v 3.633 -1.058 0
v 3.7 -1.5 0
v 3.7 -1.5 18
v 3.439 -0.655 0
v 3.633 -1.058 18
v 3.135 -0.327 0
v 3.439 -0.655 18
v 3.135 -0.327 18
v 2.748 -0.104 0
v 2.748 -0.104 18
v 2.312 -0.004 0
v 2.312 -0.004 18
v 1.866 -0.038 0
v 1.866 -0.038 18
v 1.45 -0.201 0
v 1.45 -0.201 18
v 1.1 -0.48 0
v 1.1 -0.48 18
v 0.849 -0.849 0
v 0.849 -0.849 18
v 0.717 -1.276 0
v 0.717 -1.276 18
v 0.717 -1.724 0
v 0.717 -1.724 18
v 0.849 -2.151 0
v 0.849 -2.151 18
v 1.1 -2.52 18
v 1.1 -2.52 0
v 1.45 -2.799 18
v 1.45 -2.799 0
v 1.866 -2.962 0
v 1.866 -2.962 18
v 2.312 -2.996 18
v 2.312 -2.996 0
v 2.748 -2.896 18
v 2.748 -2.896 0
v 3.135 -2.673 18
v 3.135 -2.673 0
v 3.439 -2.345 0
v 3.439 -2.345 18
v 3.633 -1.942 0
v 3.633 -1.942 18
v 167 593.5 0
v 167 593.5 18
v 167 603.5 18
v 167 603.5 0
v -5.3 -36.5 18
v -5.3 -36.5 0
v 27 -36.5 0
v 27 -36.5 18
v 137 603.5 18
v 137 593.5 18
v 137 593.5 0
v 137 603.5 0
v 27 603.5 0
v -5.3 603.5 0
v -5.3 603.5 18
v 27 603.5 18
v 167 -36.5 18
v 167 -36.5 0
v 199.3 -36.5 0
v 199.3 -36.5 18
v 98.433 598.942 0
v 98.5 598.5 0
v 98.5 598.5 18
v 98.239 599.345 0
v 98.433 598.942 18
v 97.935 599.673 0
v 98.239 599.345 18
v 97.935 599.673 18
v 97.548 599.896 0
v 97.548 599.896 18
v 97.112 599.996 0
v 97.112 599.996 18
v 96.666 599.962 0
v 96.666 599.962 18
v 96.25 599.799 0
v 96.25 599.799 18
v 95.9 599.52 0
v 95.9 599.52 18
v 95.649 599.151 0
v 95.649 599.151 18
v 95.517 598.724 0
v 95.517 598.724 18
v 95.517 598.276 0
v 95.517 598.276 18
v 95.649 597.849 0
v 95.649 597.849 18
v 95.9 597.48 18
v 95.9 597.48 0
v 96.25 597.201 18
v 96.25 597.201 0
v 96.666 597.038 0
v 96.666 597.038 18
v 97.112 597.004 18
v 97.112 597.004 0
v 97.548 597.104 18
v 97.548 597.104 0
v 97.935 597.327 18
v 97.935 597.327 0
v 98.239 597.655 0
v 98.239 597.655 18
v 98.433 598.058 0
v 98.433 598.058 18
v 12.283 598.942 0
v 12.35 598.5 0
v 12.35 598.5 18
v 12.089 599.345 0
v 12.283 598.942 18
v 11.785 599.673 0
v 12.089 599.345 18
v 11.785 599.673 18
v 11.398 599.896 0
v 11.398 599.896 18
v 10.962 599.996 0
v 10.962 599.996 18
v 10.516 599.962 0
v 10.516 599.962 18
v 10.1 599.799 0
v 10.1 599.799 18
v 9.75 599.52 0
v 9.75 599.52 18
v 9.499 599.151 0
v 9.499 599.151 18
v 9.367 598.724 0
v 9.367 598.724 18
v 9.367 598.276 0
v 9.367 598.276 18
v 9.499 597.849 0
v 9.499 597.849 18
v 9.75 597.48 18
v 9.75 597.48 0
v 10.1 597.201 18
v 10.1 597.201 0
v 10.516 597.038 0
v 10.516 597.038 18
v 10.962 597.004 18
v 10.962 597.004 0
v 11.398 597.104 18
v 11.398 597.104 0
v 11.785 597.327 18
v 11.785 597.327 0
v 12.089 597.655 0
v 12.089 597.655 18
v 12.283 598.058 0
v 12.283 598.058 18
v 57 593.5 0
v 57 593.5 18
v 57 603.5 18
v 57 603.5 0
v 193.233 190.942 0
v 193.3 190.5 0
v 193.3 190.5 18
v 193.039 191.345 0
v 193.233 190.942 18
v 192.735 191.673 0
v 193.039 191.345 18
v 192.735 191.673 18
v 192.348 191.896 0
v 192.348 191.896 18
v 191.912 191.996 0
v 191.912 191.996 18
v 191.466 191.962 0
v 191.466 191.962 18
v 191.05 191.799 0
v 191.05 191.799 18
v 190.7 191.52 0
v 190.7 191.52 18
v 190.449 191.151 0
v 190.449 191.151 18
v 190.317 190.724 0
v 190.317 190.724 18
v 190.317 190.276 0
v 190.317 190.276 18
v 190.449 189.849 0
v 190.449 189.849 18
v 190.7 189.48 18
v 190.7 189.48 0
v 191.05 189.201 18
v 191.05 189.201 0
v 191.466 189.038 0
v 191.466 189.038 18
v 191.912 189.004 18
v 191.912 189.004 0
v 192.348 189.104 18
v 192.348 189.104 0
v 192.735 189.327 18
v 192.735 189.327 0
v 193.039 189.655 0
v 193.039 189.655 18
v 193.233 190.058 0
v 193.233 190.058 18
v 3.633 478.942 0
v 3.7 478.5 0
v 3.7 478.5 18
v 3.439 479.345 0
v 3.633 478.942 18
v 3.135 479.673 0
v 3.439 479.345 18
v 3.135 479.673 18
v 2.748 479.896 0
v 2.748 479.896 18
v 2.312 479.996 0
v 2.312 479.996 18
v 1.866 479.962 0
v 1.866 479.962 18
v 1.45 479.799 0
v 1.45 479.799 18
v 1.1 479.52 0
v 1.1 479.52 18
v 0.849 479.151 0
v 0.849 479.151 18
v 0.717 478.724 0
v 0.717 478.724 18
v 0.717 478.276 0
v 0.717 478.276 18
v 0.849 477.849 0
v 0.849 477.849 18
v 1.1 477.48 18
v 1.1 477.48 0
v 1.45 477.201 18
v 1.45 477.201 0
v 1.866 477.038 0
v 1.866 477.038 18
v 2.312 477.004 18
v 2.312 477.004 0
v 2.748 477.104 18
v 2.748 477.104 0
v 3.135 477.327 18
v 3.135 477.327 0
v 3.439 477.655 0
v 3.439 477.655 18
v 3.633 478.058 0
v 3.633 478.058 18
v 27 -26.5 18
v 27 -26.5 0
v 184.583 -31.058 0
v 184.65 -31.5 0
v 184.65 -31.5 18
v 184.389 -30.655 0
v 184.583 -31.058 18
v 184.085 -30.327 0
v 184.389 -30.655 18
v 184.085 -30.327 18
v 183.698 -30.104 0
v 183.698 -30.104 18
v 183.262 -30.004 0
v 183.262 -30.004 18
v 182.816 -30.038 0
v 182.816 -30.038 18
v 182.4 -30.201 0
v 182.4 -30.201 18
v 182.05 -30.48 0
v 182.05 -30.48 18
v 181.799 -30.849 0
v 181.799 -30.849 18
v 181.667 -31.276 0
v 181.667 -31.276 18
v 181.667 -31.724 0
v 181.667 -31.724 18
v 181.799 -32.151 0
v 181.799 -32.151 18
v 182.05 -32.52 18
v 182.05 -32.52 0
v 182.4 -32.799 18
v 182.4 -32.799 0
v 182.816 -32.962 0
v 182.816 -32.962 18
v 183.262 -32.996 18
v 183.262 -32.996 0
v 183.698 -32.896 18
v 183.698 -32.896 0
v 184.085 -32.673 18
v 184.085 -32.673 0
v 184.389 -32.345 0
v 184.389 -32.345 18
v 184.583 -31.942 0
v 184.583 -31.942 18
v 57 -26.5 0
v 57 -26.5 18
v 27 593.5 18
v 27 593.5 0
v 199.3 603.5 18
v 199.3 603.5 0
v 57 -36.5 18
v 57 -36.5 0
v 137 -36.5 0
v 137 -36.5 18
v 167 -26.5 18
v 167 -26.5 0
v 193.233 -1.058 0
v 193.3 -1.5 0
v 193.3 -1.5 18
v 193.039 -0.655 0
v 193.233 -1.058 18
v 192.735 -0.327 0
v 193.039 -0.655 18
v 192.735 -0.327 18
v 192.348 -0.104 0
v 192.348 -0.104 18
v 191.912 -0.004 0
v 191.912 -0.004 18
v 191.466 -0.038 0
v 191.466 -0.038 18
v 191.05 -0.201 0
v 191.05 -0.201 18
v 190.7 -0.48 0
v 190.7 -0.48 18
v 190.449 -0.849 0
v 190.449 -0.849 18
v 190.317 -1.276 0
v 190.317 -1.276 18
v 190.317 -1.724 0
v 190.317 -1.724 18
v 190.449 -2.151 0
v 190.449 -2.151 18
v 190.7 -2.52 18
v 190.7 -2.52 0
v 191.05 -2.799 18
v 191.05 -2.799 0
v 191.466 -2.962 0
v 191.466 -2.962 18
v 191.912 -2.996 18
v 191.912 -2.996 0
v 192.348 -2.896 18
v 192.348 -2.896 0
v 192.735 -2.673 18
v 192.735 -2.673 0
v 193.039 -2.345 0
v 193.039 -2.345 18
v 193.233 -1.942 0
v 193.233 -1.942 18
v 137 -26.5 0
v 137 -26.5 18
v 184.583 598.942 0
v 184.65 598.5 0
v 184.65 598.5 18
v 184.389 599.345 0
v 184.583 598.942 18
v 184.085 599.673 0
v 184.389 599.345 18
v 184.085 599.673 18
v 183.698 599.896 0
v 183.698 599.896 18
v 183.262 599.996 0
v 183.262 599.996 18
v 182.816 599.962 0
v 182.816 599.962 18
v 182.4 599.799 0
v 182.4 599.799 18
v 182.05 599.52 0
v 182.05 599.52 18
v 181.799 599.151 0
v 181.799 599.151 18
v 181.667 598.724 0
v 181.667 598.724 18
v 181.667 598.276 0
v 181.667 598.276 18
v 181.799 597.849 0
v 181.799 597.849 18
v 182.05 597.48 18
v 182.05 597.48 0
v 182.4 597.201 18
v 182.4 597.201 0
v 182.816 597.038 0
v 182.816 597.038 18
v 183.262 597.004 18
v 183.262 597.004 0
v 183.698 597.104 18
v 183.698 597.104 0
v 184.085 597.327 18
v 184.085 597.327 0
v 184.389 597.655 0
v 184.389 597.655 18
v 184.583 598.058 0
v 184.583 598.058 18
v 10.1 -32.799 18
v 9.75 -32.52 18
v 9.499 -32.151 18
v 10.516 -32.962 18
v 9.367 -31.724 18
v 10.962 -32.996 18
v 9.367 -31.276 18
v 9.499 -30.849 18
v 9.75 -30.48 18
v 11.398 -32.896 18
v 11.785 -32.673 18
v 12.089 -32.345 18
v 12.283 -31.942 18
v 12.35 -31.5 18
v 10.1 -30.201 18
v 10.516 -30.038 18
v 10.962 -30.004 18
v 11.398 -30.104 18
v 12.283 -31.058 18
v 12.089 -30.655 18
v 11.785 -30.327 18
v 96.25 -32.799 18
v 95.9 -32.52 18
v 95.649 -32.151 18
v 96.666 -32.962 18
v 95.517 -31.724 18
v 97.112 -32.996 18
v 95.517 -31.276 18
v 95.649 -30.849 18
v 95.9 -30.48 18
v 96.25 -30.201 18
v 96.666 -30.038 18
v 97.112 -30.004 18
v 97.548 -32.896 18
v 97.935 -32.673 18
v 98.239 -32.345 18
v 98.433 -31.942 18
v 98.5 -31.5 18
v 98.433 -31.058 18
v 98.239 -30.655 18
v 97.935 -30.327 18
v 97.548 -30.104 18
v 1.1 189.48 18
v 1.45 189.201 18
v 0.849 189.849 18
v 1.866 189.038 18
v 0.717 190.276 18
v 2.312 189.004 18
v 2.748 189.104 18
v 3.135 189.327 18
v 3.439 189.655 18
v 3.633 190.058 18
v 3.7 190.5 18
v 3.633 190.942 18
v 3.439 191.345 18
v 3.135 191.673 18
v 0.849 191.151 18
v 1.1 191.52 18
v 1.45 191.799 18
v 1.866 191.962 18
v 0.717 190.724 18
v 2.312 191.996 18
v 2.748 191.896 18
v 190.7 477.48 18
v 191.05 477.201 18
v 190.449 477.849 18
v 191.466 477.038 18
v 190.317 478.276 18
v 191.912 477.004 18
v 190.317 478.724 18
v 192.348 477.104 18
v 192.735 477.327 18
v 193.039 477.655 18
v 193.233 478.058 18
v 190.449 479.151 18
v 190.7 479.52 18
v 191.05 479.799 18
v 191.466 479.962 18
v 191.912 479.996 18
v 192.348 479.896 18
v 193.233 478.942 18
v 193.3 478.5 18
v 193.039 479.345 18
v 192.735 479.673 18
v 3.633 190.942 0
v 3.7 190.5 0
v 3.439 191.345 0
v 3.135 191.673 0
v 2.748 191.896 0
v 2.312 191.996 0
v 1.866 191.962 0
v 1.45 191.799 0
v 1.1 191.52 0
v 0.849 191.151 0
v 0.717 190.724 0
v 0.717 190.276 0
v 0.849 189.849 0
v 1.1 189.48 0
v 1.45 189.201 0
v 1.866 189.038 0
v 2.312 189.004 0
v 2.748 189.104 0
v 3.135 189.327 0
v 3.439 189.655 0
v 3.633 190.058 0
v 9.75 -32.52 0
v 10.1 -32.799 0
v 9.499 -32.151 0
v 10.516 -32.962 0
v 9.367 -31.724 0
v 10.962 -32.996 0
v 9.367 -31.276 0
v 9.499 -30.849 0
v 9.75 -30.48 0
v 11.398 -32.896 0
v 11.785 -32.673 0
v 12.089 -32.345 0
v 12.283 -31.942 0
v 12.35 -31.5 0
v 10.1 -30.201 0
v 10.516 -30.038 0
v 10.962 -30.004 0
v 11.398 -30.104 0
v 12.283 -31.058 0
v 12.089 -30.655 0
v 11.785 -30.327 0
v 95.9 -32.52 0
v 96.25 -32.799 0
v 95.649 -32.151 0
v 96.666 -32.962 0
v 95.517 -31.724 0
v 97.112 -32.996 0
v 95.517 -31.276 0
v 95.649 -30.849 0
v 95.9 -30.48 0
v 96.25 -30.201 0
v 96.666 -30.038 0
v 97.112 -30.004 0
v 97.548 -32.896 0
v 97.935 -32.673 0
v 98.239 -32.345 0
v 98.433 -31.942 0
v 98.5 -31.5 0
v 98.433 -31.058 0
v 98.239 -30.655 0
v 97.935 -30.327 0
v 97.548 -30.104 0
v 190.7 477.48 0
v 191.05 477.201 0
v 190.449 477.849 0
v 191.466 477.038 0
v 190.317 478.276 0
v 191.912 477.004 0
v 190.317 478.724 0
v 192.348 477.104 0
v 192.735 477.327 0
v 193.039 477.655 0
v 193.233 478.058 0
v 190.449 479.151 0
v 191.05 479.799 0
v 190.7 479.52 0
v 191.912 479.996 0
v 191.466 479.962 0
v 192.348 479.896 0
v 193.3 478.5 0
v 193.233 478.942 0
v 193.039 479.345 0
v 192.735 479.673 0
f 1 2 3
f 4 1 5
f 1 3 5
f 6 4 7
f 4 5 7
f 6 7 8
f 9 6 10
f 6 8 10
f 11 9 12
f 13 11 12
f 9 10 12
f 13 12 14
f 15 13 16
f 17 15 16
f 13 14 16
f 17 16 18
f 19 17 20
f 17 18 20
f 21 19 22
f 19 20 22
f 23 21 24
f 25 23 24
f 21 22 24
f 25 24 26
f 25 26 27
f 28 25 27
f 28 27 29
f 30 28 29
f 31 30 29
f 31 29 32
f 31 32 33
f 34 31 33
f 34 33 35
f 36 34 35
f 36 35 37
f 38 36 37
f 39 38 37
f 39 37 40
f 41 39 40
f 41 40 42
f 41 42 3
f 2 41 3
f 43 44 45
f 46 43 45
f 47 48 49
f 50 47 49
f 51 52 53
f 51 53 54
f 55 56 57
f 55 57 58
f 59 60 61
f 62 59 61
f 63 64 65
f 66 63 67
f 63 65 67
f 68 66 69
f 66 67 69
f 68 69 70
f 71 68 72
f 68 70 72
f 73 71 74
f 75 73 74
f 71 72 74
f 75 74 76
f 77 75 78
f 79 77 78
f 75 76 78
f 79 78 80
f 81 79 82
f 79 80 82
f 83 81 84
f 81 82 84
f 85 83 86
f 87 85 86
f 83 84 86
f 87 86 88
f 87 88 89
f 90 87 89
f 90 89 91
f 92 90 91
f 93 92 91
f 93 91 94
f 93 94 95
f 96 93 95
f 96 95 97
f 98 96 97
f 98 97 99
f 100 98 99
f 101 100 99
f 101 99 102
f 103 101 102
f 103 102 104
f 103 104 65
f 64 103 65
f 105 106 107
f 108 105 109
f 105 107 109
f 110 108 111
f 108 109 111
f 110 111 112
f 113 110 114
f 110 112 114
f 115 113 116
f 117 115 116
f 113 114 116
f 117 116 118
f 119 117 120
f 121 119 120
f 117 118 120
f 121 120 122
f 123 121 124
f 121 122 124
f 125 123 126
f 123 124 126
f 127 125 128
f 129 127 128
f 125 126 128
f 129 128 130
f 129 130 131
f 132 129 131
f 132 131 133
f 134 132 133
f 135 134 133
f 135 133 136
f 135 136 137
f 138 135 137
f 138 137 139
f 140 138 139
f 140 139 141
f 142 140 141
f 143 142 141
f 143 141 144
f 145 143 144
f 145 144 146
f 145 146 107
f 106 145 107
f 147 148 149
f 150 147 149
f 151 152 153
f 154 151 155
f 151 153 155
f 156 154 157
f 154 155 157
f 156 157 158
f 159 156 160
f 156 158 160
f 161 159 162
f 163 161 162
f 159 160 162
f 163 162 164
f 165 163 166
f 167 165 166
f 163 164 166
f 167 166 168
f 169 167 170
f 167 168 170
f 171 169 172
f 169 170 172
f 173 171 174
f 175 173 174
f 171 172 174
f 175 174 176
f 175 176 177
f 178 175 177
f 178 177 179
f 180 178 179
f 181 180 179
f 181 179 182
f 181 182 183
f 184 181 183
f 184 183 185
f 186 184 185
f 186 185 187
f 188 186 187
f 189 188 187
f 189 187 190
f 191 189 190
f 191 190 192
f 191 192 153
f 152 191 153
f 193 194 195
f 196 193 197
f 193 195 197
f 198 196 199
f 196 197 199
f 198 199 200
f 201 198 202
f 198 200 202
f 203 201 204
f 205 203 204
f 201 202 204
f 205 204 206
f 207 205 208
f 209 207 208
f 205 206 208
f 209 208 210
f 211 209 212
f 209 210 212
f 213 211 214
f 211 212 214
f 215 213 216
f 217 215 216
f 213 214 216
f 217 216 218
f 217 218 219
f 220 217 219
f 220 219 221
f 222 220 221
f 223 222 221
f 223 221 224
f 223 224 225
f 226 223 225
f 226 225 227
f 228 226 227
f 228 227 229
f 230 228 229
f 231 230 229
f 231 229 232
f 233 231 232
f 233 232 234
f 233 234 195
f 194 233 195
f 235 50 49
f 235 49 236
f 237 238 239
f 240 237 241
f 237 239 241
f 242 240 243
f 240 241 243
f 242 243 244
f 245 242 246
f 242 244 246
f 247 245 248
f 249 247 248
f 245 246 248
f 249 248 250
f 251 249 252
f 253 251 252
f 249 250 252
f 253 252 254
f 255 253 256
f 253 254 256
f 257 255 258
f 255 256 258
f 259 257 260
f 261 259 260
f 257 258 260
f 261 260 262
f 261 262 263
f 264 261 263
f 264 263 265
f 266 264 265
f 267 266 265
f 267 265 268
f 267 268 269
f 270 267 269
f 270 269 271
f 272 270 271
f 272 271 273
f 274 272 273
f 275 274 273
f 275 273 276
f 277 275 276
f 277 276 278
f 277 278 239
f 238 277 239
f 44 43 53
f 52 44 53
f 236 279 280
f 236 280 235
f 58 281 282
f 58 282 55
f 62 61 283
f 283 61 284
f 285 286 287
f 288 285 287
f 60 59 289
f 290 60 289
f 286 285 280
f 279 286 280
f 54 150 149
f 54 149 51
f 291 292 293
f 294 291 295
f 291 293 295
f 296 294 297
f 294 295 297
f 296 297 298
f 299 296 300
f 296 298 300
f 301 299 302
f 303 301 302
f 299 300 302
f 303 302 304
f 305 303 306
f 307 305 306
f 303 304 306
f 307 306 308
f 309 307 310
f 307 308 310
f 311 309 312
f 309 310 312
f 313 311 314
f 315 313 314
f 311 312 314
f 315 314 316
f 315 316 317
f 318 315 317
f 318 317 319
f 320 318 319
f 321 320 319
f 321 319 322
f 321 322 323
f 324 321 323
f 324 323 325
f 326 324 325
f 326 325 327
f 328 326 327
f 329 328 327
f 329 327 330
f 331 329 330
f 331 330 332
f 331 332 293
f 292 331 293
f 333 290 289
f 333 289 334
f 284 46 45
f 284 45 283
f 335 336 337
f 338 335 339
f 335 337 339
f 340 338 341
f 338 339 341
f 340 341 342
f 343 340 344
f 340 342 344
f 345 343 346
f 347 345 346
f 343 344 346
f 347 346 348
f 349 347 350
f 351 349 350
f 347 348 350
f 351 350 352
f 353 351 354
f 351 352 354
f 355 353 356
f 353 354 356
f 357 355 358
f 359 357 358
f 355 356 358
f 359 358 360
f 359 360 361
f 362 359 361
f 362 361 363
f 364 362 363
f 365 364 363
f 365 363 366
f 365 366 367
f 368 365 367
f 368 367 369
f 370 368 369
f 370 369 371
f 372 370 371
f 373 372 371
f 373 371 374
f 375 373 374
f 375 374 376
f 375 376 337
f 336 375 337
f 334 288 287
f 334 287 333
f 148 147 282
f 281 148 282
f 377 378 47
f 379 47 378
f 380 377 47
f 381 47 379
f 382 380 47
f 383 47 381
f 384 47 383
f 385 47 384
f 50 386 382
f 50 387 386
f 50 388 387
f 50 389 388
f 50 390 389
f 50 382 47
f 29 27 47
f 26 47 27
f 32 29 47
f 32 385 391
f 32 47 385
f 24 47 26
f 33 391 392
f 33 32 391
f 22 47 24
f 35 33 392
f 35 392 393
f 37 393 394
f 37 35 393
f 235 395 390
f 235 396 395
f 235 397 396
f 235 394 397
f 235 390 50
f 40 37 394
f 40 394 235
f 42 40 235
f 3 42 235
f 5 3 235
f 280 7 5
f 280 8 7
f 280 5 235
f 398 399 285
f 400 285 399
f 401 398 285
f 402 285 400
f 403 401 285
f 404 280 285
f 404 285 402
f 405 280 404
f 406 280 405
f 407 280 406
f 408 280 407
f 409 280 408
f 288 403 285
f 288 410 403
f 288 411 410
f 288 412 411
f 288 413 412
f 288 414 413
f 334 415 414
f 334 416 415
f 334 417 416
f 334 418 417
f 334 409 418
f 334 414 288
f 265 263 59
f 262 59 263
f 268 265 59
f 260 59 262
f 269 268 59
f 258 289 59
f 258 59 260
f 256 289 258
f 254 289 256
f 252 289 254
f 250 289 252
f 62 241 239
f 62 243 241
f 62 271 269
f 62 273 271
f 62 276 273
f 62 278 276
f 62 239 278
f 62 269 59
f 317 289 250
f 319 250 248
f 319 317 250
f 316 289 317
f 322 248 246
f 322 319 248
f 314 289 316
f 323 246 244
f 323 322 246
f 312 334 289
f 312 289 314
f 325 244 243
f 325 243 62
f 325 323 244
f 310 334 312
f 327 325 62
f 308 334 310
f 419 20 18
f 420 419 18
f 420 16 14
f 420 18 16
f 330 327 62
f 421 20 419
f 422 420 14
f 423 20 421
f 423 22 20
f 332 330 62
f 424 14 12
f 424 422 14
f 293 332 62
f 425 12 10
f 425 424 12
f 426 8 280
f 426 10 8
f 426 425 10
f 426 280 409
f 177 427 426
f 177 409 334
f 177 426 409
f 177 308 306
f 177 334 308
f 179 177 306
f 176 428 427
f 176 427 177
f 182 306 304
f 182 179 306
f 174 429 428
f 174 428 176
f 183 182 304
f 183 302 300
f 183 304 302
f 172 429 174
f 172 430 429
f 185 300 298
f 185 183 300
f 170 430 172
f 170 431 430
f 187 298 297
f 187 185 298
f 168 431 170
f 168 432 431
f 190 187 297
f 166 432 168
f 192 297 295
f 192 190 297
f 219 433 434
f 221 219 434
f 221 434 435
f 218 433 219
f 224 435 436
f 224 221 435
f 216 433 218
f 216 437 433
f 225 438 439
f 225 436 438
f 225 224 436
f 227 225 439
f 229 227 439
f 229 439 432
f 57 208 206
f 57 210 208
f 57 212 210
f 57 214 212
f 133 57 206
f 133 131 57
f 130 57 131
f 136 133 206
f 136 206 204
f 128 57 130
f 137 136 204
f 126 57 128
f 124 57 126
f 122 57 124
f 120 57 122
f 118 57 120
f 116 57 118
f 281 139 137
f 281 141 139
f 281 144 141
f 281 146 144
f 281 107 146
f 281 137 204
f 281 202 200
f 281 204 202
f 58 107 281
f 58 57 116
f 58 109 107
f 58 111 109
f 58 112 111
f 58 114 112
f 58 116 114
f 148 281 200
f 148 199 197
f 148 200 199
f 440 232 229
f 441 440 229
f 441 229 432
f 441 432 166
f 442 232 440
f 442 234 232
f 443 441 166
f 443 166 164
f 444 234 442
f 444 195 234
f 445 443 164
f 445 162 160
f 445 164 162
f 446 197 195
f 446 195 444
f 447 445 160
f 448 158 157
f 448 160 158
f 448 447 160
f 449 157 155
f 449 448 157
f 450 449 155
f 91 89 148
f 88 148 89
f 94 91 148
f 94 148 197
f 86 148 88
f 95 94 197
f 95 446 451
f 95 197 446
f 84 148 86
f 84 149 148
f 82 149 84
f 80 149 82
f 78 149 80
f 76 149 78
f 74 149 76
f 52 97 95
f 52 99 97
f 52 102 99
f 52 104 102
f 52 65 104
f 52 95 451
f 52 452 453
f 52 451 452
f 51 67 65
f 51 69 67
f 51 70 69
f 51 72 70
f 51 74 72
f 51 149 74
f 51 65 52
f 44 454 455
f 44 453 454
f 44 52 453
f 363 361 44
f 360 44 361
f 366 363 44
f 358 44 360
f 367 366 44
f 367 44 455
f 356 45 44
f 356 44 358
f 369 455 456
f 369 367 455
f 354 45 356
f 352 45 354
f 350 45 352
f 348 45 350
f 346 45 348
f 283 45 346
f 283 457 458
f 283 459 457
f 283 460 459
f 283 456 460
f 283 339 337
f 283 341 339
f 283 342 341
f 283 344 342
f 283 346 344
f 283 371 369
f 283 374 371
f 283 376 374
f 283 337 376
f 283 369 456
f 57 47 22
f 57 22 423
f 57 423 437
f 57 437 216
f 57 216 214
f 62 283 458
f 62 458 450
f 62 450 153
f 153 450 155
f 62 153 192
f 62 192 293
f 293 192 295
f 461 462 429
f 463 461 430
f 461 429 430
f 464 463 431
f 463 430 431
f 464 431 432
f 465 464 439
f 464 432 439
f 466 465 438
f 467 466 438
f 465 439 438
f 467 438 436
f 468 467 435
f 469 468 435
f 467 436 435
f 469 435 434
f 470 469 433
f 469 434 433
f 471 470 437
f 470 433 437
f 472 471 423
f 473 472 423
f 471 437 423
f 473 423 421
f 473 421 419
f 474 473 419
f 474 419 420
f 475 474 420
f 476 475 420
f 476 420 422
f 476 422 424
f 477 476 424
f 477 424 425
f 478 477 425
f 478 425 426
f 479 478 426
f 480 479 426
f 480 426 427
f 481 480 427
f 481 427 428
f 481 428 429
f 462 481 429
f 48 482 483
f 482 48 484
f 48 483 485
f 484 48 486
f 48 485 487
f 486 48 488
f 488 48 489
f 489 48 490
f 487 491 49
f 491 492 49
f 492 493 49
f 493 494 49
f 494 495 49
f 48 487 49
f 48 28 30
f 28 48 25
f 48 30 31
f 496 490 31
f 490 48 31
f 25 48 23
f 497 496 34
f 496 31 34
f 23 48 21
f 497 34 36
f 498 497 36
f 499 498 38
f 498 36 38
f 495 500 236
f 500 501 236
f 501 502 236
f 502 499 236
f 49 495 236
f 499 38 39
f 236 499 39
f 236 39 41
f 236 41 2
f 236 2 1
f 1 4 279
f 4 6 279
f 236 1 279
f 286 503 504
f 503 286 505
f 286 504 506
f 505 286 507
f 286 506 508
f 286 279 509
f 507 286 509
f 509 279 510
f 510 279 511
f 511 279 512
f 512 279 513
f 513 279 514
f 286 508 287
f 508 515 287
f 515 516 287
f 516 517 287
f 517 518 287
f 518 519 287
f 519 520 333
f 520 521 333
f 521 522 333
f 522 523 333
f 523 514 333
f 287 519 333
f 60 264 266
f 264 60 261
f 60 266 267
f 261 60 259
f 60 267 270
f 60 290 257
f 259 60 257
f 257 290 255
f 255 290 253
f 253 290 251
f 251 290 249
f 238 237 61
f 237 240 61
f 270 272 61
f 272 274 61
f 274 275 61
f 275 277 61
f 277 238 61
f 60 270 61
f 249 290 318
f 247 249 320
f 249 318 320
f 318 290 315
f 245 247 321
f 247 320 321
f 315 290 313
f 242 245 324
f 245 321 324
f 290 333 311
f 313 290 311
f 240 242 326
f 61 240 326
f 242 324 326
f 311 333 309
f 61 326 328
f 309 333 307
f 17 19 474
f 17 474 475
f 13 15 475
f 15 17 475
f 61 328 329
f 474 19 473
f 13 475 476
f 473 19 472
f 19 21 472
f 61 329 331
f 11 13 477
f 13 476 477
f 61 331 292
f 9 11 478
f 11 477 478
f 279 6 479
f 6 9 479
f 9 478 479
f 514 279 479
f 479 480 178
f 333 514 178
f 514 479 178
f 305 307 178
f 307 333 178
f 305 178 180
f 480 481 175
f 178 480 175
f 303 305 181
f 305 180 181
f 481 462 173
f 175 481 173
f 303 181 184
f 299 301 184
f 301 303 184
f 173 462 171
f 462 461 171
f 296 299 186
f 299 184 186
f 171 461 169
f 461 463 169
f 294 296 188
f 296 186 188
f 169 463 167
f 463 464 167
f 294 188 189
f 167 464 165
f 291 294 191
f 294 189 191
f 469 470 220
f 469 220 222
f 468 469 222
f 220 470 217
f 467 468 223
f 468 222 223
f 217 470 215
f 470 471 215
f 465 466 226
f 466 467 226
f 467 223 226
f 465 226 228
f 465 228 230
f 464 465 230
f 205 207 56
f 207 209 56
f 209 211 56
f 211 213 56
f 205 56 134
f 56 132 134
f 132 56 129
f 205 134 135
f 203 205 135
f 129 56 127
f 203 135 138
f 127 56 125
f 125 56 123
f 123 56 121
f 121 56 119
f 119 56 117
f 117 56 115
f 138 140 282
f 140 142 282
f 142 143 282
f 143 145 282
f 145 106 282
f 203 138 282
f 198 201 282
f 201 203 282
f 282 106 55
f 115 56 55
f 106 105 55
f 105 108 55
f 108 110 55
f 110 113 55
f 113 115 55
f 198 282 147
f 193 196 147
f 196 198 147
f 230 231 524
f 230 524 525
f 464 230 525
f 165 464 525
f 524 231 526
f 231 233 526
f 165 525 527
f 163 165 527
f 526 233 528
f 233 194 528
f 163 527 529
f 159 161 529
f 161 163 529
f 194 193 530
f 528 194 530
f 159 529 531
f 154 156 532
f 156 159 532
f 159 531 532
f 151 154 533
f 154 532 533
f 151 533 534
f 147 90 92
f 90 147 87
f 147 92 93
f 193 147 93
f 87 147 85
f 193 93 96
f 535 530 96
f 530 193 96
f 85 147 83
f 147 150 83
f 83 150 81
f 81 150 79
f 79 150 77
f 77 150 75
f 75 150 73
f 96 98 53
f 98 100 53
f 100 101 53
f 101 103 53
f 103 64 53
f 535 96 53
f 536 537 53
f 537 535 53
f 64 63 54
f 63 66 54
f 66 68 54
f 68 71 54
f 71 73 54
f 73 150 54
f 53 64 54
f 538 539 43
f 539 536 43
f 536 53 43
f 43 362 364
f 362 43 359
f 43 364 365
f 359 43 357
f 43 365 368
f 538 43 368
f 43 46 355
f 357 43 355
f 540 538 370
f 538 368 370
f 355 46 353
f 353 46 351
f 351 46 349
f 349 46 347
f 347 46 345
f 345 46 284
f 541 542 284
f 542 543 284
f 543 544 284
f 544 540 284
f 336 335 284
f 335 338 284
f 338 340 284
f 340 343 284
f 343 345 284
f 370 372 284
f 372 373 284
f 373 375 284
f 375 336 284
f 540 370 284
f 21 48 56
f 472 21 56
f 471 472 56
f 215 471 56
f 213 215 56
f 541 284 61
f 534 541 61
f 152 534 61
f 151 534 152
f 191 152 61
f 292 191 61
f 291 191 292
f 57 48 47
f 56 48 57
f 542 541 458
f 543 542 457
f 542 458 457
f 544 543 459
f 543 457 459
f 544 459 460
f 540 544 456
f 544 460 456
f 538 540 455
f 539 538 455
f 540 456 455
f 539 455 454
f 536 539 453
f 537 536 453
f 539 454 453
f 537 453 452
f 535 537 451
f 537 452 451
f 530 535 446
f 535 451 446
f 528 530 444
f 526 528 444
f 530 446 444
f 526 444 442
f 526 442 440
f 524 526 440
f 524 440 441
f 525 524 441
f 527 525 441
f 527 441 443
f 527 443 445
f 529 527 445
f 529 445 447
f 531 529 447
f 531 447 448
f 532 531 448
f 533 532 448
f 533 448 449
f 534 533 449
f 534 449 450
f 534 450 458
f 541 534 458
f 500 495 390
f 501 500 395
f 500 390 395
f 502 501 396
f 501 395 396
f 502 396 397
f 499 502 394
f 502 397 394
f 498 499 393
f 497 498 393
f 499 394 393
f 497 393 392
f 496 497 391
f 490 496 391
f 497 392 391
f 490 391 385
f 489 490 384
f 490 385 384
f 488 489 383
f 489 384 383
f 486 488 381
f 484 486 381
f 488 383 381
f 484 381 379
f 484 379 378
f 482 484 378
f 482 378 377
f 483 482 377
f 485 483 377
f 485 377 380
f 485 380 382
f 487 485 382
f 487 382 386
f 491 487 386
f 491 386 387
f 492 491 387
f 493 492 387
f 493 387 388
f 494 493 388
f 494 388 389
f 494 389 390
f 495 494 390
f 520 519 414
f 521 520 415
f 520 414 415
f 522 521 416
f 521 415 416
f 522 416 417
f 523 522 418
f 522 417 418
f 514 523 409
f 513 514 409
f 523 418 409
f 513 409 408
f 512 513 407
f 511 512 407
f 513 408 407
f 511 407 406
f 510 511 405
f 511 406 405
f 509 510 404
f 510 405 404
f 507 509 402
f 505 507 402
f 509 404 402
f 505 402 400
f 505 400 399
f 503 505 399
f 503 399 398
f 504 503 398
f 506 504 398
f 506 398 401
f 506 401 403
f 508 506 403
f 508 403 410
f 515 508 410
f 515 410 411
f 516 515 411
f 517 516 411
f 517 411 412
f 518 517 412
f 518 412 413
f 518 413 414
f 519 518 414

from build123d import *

# Parameters (mm, degrees)
SKETCH1_W                = 204.6
SKETCH1_H                = 640
BOSS_EXTRUDE1_DEPTH      = 18
SKETCH4_W                = 30
SKETCH4_H                = 10
CUT_EXTRUDE1_DEPTH       = 18
F_3_0_3_DIAMETER_HOLE3_D = 3
F_3_0_3_DIAMETER_HOLE5_D = 3


with BuildPart() as part:
    # Sketch1 → Boss-Extrude1 (new body)
    with BuildSketch(Plane.XY):
        with Locations((97, 283.5)):
            Rectangle(SKETCH1_W, SKETCH1_H)
    extrude(amount=BOSS_EXTRUDE1_DEPTH)

    # Sketch4 → Cut-Extrude1 (cut)
    with BuildSketch(Plane(origin=(0, 0, 0), x_dir=(-1, 0, 0), z_dir=(0, 0, -1))):
        with Locations((-42, -31.5)):
            Rectangle(SKETCH4_W, SKETCH4_H)
        with Locations((-152, -31.5)):
            Rectangle(SKETCH4_W, SKETCH4_H)
        with Locations((-42, 598.5)):
            Rectangle(SKETCH4_W, SKETCH4_H)
        with Locations((-152, 598.5)):
            Rectangle(SKETCH4_W, SKETCH4_H)
    extrude(amount=-CUT_EXTRUDE1_DEPTH, mode=Mode.SUBTRACT)

    # Ø3.0 (3) Diameter Hole3 (through all)
    with Locations(Plane(origin=(0, 0, 0), x_dir=(-1, 0, 0), z_dir=(0, 0, -1))):
        with Locations((-2.2, 190.5), (-2.2, -1.5), (-191.8, -1.5), (-191.8, 190.5), (-191.8, 478.5), (-2.2, 478.5)):
            Hole(F_3_0_3_DIAMETER_HOLE3_D / 2)

    # Ø3.0 (3) Diameter Hole5 (through all)
    with Locations(Plane(origin=(0, 0, 0), x_dir=(-1, 0, 0), z_dir=(0, 0, -1))):
        with Locations((238.536571684, 43.354956744), (-97, -31.5), (-183.15, -31.5), (-10.85, -31.5), (-10.85, 598.5), (-183.15, 598.5), (-97, 598.5)):
            Hole(F_3_0_3_DIAMETER_HOLE5_D / 2)


solid = part.part
